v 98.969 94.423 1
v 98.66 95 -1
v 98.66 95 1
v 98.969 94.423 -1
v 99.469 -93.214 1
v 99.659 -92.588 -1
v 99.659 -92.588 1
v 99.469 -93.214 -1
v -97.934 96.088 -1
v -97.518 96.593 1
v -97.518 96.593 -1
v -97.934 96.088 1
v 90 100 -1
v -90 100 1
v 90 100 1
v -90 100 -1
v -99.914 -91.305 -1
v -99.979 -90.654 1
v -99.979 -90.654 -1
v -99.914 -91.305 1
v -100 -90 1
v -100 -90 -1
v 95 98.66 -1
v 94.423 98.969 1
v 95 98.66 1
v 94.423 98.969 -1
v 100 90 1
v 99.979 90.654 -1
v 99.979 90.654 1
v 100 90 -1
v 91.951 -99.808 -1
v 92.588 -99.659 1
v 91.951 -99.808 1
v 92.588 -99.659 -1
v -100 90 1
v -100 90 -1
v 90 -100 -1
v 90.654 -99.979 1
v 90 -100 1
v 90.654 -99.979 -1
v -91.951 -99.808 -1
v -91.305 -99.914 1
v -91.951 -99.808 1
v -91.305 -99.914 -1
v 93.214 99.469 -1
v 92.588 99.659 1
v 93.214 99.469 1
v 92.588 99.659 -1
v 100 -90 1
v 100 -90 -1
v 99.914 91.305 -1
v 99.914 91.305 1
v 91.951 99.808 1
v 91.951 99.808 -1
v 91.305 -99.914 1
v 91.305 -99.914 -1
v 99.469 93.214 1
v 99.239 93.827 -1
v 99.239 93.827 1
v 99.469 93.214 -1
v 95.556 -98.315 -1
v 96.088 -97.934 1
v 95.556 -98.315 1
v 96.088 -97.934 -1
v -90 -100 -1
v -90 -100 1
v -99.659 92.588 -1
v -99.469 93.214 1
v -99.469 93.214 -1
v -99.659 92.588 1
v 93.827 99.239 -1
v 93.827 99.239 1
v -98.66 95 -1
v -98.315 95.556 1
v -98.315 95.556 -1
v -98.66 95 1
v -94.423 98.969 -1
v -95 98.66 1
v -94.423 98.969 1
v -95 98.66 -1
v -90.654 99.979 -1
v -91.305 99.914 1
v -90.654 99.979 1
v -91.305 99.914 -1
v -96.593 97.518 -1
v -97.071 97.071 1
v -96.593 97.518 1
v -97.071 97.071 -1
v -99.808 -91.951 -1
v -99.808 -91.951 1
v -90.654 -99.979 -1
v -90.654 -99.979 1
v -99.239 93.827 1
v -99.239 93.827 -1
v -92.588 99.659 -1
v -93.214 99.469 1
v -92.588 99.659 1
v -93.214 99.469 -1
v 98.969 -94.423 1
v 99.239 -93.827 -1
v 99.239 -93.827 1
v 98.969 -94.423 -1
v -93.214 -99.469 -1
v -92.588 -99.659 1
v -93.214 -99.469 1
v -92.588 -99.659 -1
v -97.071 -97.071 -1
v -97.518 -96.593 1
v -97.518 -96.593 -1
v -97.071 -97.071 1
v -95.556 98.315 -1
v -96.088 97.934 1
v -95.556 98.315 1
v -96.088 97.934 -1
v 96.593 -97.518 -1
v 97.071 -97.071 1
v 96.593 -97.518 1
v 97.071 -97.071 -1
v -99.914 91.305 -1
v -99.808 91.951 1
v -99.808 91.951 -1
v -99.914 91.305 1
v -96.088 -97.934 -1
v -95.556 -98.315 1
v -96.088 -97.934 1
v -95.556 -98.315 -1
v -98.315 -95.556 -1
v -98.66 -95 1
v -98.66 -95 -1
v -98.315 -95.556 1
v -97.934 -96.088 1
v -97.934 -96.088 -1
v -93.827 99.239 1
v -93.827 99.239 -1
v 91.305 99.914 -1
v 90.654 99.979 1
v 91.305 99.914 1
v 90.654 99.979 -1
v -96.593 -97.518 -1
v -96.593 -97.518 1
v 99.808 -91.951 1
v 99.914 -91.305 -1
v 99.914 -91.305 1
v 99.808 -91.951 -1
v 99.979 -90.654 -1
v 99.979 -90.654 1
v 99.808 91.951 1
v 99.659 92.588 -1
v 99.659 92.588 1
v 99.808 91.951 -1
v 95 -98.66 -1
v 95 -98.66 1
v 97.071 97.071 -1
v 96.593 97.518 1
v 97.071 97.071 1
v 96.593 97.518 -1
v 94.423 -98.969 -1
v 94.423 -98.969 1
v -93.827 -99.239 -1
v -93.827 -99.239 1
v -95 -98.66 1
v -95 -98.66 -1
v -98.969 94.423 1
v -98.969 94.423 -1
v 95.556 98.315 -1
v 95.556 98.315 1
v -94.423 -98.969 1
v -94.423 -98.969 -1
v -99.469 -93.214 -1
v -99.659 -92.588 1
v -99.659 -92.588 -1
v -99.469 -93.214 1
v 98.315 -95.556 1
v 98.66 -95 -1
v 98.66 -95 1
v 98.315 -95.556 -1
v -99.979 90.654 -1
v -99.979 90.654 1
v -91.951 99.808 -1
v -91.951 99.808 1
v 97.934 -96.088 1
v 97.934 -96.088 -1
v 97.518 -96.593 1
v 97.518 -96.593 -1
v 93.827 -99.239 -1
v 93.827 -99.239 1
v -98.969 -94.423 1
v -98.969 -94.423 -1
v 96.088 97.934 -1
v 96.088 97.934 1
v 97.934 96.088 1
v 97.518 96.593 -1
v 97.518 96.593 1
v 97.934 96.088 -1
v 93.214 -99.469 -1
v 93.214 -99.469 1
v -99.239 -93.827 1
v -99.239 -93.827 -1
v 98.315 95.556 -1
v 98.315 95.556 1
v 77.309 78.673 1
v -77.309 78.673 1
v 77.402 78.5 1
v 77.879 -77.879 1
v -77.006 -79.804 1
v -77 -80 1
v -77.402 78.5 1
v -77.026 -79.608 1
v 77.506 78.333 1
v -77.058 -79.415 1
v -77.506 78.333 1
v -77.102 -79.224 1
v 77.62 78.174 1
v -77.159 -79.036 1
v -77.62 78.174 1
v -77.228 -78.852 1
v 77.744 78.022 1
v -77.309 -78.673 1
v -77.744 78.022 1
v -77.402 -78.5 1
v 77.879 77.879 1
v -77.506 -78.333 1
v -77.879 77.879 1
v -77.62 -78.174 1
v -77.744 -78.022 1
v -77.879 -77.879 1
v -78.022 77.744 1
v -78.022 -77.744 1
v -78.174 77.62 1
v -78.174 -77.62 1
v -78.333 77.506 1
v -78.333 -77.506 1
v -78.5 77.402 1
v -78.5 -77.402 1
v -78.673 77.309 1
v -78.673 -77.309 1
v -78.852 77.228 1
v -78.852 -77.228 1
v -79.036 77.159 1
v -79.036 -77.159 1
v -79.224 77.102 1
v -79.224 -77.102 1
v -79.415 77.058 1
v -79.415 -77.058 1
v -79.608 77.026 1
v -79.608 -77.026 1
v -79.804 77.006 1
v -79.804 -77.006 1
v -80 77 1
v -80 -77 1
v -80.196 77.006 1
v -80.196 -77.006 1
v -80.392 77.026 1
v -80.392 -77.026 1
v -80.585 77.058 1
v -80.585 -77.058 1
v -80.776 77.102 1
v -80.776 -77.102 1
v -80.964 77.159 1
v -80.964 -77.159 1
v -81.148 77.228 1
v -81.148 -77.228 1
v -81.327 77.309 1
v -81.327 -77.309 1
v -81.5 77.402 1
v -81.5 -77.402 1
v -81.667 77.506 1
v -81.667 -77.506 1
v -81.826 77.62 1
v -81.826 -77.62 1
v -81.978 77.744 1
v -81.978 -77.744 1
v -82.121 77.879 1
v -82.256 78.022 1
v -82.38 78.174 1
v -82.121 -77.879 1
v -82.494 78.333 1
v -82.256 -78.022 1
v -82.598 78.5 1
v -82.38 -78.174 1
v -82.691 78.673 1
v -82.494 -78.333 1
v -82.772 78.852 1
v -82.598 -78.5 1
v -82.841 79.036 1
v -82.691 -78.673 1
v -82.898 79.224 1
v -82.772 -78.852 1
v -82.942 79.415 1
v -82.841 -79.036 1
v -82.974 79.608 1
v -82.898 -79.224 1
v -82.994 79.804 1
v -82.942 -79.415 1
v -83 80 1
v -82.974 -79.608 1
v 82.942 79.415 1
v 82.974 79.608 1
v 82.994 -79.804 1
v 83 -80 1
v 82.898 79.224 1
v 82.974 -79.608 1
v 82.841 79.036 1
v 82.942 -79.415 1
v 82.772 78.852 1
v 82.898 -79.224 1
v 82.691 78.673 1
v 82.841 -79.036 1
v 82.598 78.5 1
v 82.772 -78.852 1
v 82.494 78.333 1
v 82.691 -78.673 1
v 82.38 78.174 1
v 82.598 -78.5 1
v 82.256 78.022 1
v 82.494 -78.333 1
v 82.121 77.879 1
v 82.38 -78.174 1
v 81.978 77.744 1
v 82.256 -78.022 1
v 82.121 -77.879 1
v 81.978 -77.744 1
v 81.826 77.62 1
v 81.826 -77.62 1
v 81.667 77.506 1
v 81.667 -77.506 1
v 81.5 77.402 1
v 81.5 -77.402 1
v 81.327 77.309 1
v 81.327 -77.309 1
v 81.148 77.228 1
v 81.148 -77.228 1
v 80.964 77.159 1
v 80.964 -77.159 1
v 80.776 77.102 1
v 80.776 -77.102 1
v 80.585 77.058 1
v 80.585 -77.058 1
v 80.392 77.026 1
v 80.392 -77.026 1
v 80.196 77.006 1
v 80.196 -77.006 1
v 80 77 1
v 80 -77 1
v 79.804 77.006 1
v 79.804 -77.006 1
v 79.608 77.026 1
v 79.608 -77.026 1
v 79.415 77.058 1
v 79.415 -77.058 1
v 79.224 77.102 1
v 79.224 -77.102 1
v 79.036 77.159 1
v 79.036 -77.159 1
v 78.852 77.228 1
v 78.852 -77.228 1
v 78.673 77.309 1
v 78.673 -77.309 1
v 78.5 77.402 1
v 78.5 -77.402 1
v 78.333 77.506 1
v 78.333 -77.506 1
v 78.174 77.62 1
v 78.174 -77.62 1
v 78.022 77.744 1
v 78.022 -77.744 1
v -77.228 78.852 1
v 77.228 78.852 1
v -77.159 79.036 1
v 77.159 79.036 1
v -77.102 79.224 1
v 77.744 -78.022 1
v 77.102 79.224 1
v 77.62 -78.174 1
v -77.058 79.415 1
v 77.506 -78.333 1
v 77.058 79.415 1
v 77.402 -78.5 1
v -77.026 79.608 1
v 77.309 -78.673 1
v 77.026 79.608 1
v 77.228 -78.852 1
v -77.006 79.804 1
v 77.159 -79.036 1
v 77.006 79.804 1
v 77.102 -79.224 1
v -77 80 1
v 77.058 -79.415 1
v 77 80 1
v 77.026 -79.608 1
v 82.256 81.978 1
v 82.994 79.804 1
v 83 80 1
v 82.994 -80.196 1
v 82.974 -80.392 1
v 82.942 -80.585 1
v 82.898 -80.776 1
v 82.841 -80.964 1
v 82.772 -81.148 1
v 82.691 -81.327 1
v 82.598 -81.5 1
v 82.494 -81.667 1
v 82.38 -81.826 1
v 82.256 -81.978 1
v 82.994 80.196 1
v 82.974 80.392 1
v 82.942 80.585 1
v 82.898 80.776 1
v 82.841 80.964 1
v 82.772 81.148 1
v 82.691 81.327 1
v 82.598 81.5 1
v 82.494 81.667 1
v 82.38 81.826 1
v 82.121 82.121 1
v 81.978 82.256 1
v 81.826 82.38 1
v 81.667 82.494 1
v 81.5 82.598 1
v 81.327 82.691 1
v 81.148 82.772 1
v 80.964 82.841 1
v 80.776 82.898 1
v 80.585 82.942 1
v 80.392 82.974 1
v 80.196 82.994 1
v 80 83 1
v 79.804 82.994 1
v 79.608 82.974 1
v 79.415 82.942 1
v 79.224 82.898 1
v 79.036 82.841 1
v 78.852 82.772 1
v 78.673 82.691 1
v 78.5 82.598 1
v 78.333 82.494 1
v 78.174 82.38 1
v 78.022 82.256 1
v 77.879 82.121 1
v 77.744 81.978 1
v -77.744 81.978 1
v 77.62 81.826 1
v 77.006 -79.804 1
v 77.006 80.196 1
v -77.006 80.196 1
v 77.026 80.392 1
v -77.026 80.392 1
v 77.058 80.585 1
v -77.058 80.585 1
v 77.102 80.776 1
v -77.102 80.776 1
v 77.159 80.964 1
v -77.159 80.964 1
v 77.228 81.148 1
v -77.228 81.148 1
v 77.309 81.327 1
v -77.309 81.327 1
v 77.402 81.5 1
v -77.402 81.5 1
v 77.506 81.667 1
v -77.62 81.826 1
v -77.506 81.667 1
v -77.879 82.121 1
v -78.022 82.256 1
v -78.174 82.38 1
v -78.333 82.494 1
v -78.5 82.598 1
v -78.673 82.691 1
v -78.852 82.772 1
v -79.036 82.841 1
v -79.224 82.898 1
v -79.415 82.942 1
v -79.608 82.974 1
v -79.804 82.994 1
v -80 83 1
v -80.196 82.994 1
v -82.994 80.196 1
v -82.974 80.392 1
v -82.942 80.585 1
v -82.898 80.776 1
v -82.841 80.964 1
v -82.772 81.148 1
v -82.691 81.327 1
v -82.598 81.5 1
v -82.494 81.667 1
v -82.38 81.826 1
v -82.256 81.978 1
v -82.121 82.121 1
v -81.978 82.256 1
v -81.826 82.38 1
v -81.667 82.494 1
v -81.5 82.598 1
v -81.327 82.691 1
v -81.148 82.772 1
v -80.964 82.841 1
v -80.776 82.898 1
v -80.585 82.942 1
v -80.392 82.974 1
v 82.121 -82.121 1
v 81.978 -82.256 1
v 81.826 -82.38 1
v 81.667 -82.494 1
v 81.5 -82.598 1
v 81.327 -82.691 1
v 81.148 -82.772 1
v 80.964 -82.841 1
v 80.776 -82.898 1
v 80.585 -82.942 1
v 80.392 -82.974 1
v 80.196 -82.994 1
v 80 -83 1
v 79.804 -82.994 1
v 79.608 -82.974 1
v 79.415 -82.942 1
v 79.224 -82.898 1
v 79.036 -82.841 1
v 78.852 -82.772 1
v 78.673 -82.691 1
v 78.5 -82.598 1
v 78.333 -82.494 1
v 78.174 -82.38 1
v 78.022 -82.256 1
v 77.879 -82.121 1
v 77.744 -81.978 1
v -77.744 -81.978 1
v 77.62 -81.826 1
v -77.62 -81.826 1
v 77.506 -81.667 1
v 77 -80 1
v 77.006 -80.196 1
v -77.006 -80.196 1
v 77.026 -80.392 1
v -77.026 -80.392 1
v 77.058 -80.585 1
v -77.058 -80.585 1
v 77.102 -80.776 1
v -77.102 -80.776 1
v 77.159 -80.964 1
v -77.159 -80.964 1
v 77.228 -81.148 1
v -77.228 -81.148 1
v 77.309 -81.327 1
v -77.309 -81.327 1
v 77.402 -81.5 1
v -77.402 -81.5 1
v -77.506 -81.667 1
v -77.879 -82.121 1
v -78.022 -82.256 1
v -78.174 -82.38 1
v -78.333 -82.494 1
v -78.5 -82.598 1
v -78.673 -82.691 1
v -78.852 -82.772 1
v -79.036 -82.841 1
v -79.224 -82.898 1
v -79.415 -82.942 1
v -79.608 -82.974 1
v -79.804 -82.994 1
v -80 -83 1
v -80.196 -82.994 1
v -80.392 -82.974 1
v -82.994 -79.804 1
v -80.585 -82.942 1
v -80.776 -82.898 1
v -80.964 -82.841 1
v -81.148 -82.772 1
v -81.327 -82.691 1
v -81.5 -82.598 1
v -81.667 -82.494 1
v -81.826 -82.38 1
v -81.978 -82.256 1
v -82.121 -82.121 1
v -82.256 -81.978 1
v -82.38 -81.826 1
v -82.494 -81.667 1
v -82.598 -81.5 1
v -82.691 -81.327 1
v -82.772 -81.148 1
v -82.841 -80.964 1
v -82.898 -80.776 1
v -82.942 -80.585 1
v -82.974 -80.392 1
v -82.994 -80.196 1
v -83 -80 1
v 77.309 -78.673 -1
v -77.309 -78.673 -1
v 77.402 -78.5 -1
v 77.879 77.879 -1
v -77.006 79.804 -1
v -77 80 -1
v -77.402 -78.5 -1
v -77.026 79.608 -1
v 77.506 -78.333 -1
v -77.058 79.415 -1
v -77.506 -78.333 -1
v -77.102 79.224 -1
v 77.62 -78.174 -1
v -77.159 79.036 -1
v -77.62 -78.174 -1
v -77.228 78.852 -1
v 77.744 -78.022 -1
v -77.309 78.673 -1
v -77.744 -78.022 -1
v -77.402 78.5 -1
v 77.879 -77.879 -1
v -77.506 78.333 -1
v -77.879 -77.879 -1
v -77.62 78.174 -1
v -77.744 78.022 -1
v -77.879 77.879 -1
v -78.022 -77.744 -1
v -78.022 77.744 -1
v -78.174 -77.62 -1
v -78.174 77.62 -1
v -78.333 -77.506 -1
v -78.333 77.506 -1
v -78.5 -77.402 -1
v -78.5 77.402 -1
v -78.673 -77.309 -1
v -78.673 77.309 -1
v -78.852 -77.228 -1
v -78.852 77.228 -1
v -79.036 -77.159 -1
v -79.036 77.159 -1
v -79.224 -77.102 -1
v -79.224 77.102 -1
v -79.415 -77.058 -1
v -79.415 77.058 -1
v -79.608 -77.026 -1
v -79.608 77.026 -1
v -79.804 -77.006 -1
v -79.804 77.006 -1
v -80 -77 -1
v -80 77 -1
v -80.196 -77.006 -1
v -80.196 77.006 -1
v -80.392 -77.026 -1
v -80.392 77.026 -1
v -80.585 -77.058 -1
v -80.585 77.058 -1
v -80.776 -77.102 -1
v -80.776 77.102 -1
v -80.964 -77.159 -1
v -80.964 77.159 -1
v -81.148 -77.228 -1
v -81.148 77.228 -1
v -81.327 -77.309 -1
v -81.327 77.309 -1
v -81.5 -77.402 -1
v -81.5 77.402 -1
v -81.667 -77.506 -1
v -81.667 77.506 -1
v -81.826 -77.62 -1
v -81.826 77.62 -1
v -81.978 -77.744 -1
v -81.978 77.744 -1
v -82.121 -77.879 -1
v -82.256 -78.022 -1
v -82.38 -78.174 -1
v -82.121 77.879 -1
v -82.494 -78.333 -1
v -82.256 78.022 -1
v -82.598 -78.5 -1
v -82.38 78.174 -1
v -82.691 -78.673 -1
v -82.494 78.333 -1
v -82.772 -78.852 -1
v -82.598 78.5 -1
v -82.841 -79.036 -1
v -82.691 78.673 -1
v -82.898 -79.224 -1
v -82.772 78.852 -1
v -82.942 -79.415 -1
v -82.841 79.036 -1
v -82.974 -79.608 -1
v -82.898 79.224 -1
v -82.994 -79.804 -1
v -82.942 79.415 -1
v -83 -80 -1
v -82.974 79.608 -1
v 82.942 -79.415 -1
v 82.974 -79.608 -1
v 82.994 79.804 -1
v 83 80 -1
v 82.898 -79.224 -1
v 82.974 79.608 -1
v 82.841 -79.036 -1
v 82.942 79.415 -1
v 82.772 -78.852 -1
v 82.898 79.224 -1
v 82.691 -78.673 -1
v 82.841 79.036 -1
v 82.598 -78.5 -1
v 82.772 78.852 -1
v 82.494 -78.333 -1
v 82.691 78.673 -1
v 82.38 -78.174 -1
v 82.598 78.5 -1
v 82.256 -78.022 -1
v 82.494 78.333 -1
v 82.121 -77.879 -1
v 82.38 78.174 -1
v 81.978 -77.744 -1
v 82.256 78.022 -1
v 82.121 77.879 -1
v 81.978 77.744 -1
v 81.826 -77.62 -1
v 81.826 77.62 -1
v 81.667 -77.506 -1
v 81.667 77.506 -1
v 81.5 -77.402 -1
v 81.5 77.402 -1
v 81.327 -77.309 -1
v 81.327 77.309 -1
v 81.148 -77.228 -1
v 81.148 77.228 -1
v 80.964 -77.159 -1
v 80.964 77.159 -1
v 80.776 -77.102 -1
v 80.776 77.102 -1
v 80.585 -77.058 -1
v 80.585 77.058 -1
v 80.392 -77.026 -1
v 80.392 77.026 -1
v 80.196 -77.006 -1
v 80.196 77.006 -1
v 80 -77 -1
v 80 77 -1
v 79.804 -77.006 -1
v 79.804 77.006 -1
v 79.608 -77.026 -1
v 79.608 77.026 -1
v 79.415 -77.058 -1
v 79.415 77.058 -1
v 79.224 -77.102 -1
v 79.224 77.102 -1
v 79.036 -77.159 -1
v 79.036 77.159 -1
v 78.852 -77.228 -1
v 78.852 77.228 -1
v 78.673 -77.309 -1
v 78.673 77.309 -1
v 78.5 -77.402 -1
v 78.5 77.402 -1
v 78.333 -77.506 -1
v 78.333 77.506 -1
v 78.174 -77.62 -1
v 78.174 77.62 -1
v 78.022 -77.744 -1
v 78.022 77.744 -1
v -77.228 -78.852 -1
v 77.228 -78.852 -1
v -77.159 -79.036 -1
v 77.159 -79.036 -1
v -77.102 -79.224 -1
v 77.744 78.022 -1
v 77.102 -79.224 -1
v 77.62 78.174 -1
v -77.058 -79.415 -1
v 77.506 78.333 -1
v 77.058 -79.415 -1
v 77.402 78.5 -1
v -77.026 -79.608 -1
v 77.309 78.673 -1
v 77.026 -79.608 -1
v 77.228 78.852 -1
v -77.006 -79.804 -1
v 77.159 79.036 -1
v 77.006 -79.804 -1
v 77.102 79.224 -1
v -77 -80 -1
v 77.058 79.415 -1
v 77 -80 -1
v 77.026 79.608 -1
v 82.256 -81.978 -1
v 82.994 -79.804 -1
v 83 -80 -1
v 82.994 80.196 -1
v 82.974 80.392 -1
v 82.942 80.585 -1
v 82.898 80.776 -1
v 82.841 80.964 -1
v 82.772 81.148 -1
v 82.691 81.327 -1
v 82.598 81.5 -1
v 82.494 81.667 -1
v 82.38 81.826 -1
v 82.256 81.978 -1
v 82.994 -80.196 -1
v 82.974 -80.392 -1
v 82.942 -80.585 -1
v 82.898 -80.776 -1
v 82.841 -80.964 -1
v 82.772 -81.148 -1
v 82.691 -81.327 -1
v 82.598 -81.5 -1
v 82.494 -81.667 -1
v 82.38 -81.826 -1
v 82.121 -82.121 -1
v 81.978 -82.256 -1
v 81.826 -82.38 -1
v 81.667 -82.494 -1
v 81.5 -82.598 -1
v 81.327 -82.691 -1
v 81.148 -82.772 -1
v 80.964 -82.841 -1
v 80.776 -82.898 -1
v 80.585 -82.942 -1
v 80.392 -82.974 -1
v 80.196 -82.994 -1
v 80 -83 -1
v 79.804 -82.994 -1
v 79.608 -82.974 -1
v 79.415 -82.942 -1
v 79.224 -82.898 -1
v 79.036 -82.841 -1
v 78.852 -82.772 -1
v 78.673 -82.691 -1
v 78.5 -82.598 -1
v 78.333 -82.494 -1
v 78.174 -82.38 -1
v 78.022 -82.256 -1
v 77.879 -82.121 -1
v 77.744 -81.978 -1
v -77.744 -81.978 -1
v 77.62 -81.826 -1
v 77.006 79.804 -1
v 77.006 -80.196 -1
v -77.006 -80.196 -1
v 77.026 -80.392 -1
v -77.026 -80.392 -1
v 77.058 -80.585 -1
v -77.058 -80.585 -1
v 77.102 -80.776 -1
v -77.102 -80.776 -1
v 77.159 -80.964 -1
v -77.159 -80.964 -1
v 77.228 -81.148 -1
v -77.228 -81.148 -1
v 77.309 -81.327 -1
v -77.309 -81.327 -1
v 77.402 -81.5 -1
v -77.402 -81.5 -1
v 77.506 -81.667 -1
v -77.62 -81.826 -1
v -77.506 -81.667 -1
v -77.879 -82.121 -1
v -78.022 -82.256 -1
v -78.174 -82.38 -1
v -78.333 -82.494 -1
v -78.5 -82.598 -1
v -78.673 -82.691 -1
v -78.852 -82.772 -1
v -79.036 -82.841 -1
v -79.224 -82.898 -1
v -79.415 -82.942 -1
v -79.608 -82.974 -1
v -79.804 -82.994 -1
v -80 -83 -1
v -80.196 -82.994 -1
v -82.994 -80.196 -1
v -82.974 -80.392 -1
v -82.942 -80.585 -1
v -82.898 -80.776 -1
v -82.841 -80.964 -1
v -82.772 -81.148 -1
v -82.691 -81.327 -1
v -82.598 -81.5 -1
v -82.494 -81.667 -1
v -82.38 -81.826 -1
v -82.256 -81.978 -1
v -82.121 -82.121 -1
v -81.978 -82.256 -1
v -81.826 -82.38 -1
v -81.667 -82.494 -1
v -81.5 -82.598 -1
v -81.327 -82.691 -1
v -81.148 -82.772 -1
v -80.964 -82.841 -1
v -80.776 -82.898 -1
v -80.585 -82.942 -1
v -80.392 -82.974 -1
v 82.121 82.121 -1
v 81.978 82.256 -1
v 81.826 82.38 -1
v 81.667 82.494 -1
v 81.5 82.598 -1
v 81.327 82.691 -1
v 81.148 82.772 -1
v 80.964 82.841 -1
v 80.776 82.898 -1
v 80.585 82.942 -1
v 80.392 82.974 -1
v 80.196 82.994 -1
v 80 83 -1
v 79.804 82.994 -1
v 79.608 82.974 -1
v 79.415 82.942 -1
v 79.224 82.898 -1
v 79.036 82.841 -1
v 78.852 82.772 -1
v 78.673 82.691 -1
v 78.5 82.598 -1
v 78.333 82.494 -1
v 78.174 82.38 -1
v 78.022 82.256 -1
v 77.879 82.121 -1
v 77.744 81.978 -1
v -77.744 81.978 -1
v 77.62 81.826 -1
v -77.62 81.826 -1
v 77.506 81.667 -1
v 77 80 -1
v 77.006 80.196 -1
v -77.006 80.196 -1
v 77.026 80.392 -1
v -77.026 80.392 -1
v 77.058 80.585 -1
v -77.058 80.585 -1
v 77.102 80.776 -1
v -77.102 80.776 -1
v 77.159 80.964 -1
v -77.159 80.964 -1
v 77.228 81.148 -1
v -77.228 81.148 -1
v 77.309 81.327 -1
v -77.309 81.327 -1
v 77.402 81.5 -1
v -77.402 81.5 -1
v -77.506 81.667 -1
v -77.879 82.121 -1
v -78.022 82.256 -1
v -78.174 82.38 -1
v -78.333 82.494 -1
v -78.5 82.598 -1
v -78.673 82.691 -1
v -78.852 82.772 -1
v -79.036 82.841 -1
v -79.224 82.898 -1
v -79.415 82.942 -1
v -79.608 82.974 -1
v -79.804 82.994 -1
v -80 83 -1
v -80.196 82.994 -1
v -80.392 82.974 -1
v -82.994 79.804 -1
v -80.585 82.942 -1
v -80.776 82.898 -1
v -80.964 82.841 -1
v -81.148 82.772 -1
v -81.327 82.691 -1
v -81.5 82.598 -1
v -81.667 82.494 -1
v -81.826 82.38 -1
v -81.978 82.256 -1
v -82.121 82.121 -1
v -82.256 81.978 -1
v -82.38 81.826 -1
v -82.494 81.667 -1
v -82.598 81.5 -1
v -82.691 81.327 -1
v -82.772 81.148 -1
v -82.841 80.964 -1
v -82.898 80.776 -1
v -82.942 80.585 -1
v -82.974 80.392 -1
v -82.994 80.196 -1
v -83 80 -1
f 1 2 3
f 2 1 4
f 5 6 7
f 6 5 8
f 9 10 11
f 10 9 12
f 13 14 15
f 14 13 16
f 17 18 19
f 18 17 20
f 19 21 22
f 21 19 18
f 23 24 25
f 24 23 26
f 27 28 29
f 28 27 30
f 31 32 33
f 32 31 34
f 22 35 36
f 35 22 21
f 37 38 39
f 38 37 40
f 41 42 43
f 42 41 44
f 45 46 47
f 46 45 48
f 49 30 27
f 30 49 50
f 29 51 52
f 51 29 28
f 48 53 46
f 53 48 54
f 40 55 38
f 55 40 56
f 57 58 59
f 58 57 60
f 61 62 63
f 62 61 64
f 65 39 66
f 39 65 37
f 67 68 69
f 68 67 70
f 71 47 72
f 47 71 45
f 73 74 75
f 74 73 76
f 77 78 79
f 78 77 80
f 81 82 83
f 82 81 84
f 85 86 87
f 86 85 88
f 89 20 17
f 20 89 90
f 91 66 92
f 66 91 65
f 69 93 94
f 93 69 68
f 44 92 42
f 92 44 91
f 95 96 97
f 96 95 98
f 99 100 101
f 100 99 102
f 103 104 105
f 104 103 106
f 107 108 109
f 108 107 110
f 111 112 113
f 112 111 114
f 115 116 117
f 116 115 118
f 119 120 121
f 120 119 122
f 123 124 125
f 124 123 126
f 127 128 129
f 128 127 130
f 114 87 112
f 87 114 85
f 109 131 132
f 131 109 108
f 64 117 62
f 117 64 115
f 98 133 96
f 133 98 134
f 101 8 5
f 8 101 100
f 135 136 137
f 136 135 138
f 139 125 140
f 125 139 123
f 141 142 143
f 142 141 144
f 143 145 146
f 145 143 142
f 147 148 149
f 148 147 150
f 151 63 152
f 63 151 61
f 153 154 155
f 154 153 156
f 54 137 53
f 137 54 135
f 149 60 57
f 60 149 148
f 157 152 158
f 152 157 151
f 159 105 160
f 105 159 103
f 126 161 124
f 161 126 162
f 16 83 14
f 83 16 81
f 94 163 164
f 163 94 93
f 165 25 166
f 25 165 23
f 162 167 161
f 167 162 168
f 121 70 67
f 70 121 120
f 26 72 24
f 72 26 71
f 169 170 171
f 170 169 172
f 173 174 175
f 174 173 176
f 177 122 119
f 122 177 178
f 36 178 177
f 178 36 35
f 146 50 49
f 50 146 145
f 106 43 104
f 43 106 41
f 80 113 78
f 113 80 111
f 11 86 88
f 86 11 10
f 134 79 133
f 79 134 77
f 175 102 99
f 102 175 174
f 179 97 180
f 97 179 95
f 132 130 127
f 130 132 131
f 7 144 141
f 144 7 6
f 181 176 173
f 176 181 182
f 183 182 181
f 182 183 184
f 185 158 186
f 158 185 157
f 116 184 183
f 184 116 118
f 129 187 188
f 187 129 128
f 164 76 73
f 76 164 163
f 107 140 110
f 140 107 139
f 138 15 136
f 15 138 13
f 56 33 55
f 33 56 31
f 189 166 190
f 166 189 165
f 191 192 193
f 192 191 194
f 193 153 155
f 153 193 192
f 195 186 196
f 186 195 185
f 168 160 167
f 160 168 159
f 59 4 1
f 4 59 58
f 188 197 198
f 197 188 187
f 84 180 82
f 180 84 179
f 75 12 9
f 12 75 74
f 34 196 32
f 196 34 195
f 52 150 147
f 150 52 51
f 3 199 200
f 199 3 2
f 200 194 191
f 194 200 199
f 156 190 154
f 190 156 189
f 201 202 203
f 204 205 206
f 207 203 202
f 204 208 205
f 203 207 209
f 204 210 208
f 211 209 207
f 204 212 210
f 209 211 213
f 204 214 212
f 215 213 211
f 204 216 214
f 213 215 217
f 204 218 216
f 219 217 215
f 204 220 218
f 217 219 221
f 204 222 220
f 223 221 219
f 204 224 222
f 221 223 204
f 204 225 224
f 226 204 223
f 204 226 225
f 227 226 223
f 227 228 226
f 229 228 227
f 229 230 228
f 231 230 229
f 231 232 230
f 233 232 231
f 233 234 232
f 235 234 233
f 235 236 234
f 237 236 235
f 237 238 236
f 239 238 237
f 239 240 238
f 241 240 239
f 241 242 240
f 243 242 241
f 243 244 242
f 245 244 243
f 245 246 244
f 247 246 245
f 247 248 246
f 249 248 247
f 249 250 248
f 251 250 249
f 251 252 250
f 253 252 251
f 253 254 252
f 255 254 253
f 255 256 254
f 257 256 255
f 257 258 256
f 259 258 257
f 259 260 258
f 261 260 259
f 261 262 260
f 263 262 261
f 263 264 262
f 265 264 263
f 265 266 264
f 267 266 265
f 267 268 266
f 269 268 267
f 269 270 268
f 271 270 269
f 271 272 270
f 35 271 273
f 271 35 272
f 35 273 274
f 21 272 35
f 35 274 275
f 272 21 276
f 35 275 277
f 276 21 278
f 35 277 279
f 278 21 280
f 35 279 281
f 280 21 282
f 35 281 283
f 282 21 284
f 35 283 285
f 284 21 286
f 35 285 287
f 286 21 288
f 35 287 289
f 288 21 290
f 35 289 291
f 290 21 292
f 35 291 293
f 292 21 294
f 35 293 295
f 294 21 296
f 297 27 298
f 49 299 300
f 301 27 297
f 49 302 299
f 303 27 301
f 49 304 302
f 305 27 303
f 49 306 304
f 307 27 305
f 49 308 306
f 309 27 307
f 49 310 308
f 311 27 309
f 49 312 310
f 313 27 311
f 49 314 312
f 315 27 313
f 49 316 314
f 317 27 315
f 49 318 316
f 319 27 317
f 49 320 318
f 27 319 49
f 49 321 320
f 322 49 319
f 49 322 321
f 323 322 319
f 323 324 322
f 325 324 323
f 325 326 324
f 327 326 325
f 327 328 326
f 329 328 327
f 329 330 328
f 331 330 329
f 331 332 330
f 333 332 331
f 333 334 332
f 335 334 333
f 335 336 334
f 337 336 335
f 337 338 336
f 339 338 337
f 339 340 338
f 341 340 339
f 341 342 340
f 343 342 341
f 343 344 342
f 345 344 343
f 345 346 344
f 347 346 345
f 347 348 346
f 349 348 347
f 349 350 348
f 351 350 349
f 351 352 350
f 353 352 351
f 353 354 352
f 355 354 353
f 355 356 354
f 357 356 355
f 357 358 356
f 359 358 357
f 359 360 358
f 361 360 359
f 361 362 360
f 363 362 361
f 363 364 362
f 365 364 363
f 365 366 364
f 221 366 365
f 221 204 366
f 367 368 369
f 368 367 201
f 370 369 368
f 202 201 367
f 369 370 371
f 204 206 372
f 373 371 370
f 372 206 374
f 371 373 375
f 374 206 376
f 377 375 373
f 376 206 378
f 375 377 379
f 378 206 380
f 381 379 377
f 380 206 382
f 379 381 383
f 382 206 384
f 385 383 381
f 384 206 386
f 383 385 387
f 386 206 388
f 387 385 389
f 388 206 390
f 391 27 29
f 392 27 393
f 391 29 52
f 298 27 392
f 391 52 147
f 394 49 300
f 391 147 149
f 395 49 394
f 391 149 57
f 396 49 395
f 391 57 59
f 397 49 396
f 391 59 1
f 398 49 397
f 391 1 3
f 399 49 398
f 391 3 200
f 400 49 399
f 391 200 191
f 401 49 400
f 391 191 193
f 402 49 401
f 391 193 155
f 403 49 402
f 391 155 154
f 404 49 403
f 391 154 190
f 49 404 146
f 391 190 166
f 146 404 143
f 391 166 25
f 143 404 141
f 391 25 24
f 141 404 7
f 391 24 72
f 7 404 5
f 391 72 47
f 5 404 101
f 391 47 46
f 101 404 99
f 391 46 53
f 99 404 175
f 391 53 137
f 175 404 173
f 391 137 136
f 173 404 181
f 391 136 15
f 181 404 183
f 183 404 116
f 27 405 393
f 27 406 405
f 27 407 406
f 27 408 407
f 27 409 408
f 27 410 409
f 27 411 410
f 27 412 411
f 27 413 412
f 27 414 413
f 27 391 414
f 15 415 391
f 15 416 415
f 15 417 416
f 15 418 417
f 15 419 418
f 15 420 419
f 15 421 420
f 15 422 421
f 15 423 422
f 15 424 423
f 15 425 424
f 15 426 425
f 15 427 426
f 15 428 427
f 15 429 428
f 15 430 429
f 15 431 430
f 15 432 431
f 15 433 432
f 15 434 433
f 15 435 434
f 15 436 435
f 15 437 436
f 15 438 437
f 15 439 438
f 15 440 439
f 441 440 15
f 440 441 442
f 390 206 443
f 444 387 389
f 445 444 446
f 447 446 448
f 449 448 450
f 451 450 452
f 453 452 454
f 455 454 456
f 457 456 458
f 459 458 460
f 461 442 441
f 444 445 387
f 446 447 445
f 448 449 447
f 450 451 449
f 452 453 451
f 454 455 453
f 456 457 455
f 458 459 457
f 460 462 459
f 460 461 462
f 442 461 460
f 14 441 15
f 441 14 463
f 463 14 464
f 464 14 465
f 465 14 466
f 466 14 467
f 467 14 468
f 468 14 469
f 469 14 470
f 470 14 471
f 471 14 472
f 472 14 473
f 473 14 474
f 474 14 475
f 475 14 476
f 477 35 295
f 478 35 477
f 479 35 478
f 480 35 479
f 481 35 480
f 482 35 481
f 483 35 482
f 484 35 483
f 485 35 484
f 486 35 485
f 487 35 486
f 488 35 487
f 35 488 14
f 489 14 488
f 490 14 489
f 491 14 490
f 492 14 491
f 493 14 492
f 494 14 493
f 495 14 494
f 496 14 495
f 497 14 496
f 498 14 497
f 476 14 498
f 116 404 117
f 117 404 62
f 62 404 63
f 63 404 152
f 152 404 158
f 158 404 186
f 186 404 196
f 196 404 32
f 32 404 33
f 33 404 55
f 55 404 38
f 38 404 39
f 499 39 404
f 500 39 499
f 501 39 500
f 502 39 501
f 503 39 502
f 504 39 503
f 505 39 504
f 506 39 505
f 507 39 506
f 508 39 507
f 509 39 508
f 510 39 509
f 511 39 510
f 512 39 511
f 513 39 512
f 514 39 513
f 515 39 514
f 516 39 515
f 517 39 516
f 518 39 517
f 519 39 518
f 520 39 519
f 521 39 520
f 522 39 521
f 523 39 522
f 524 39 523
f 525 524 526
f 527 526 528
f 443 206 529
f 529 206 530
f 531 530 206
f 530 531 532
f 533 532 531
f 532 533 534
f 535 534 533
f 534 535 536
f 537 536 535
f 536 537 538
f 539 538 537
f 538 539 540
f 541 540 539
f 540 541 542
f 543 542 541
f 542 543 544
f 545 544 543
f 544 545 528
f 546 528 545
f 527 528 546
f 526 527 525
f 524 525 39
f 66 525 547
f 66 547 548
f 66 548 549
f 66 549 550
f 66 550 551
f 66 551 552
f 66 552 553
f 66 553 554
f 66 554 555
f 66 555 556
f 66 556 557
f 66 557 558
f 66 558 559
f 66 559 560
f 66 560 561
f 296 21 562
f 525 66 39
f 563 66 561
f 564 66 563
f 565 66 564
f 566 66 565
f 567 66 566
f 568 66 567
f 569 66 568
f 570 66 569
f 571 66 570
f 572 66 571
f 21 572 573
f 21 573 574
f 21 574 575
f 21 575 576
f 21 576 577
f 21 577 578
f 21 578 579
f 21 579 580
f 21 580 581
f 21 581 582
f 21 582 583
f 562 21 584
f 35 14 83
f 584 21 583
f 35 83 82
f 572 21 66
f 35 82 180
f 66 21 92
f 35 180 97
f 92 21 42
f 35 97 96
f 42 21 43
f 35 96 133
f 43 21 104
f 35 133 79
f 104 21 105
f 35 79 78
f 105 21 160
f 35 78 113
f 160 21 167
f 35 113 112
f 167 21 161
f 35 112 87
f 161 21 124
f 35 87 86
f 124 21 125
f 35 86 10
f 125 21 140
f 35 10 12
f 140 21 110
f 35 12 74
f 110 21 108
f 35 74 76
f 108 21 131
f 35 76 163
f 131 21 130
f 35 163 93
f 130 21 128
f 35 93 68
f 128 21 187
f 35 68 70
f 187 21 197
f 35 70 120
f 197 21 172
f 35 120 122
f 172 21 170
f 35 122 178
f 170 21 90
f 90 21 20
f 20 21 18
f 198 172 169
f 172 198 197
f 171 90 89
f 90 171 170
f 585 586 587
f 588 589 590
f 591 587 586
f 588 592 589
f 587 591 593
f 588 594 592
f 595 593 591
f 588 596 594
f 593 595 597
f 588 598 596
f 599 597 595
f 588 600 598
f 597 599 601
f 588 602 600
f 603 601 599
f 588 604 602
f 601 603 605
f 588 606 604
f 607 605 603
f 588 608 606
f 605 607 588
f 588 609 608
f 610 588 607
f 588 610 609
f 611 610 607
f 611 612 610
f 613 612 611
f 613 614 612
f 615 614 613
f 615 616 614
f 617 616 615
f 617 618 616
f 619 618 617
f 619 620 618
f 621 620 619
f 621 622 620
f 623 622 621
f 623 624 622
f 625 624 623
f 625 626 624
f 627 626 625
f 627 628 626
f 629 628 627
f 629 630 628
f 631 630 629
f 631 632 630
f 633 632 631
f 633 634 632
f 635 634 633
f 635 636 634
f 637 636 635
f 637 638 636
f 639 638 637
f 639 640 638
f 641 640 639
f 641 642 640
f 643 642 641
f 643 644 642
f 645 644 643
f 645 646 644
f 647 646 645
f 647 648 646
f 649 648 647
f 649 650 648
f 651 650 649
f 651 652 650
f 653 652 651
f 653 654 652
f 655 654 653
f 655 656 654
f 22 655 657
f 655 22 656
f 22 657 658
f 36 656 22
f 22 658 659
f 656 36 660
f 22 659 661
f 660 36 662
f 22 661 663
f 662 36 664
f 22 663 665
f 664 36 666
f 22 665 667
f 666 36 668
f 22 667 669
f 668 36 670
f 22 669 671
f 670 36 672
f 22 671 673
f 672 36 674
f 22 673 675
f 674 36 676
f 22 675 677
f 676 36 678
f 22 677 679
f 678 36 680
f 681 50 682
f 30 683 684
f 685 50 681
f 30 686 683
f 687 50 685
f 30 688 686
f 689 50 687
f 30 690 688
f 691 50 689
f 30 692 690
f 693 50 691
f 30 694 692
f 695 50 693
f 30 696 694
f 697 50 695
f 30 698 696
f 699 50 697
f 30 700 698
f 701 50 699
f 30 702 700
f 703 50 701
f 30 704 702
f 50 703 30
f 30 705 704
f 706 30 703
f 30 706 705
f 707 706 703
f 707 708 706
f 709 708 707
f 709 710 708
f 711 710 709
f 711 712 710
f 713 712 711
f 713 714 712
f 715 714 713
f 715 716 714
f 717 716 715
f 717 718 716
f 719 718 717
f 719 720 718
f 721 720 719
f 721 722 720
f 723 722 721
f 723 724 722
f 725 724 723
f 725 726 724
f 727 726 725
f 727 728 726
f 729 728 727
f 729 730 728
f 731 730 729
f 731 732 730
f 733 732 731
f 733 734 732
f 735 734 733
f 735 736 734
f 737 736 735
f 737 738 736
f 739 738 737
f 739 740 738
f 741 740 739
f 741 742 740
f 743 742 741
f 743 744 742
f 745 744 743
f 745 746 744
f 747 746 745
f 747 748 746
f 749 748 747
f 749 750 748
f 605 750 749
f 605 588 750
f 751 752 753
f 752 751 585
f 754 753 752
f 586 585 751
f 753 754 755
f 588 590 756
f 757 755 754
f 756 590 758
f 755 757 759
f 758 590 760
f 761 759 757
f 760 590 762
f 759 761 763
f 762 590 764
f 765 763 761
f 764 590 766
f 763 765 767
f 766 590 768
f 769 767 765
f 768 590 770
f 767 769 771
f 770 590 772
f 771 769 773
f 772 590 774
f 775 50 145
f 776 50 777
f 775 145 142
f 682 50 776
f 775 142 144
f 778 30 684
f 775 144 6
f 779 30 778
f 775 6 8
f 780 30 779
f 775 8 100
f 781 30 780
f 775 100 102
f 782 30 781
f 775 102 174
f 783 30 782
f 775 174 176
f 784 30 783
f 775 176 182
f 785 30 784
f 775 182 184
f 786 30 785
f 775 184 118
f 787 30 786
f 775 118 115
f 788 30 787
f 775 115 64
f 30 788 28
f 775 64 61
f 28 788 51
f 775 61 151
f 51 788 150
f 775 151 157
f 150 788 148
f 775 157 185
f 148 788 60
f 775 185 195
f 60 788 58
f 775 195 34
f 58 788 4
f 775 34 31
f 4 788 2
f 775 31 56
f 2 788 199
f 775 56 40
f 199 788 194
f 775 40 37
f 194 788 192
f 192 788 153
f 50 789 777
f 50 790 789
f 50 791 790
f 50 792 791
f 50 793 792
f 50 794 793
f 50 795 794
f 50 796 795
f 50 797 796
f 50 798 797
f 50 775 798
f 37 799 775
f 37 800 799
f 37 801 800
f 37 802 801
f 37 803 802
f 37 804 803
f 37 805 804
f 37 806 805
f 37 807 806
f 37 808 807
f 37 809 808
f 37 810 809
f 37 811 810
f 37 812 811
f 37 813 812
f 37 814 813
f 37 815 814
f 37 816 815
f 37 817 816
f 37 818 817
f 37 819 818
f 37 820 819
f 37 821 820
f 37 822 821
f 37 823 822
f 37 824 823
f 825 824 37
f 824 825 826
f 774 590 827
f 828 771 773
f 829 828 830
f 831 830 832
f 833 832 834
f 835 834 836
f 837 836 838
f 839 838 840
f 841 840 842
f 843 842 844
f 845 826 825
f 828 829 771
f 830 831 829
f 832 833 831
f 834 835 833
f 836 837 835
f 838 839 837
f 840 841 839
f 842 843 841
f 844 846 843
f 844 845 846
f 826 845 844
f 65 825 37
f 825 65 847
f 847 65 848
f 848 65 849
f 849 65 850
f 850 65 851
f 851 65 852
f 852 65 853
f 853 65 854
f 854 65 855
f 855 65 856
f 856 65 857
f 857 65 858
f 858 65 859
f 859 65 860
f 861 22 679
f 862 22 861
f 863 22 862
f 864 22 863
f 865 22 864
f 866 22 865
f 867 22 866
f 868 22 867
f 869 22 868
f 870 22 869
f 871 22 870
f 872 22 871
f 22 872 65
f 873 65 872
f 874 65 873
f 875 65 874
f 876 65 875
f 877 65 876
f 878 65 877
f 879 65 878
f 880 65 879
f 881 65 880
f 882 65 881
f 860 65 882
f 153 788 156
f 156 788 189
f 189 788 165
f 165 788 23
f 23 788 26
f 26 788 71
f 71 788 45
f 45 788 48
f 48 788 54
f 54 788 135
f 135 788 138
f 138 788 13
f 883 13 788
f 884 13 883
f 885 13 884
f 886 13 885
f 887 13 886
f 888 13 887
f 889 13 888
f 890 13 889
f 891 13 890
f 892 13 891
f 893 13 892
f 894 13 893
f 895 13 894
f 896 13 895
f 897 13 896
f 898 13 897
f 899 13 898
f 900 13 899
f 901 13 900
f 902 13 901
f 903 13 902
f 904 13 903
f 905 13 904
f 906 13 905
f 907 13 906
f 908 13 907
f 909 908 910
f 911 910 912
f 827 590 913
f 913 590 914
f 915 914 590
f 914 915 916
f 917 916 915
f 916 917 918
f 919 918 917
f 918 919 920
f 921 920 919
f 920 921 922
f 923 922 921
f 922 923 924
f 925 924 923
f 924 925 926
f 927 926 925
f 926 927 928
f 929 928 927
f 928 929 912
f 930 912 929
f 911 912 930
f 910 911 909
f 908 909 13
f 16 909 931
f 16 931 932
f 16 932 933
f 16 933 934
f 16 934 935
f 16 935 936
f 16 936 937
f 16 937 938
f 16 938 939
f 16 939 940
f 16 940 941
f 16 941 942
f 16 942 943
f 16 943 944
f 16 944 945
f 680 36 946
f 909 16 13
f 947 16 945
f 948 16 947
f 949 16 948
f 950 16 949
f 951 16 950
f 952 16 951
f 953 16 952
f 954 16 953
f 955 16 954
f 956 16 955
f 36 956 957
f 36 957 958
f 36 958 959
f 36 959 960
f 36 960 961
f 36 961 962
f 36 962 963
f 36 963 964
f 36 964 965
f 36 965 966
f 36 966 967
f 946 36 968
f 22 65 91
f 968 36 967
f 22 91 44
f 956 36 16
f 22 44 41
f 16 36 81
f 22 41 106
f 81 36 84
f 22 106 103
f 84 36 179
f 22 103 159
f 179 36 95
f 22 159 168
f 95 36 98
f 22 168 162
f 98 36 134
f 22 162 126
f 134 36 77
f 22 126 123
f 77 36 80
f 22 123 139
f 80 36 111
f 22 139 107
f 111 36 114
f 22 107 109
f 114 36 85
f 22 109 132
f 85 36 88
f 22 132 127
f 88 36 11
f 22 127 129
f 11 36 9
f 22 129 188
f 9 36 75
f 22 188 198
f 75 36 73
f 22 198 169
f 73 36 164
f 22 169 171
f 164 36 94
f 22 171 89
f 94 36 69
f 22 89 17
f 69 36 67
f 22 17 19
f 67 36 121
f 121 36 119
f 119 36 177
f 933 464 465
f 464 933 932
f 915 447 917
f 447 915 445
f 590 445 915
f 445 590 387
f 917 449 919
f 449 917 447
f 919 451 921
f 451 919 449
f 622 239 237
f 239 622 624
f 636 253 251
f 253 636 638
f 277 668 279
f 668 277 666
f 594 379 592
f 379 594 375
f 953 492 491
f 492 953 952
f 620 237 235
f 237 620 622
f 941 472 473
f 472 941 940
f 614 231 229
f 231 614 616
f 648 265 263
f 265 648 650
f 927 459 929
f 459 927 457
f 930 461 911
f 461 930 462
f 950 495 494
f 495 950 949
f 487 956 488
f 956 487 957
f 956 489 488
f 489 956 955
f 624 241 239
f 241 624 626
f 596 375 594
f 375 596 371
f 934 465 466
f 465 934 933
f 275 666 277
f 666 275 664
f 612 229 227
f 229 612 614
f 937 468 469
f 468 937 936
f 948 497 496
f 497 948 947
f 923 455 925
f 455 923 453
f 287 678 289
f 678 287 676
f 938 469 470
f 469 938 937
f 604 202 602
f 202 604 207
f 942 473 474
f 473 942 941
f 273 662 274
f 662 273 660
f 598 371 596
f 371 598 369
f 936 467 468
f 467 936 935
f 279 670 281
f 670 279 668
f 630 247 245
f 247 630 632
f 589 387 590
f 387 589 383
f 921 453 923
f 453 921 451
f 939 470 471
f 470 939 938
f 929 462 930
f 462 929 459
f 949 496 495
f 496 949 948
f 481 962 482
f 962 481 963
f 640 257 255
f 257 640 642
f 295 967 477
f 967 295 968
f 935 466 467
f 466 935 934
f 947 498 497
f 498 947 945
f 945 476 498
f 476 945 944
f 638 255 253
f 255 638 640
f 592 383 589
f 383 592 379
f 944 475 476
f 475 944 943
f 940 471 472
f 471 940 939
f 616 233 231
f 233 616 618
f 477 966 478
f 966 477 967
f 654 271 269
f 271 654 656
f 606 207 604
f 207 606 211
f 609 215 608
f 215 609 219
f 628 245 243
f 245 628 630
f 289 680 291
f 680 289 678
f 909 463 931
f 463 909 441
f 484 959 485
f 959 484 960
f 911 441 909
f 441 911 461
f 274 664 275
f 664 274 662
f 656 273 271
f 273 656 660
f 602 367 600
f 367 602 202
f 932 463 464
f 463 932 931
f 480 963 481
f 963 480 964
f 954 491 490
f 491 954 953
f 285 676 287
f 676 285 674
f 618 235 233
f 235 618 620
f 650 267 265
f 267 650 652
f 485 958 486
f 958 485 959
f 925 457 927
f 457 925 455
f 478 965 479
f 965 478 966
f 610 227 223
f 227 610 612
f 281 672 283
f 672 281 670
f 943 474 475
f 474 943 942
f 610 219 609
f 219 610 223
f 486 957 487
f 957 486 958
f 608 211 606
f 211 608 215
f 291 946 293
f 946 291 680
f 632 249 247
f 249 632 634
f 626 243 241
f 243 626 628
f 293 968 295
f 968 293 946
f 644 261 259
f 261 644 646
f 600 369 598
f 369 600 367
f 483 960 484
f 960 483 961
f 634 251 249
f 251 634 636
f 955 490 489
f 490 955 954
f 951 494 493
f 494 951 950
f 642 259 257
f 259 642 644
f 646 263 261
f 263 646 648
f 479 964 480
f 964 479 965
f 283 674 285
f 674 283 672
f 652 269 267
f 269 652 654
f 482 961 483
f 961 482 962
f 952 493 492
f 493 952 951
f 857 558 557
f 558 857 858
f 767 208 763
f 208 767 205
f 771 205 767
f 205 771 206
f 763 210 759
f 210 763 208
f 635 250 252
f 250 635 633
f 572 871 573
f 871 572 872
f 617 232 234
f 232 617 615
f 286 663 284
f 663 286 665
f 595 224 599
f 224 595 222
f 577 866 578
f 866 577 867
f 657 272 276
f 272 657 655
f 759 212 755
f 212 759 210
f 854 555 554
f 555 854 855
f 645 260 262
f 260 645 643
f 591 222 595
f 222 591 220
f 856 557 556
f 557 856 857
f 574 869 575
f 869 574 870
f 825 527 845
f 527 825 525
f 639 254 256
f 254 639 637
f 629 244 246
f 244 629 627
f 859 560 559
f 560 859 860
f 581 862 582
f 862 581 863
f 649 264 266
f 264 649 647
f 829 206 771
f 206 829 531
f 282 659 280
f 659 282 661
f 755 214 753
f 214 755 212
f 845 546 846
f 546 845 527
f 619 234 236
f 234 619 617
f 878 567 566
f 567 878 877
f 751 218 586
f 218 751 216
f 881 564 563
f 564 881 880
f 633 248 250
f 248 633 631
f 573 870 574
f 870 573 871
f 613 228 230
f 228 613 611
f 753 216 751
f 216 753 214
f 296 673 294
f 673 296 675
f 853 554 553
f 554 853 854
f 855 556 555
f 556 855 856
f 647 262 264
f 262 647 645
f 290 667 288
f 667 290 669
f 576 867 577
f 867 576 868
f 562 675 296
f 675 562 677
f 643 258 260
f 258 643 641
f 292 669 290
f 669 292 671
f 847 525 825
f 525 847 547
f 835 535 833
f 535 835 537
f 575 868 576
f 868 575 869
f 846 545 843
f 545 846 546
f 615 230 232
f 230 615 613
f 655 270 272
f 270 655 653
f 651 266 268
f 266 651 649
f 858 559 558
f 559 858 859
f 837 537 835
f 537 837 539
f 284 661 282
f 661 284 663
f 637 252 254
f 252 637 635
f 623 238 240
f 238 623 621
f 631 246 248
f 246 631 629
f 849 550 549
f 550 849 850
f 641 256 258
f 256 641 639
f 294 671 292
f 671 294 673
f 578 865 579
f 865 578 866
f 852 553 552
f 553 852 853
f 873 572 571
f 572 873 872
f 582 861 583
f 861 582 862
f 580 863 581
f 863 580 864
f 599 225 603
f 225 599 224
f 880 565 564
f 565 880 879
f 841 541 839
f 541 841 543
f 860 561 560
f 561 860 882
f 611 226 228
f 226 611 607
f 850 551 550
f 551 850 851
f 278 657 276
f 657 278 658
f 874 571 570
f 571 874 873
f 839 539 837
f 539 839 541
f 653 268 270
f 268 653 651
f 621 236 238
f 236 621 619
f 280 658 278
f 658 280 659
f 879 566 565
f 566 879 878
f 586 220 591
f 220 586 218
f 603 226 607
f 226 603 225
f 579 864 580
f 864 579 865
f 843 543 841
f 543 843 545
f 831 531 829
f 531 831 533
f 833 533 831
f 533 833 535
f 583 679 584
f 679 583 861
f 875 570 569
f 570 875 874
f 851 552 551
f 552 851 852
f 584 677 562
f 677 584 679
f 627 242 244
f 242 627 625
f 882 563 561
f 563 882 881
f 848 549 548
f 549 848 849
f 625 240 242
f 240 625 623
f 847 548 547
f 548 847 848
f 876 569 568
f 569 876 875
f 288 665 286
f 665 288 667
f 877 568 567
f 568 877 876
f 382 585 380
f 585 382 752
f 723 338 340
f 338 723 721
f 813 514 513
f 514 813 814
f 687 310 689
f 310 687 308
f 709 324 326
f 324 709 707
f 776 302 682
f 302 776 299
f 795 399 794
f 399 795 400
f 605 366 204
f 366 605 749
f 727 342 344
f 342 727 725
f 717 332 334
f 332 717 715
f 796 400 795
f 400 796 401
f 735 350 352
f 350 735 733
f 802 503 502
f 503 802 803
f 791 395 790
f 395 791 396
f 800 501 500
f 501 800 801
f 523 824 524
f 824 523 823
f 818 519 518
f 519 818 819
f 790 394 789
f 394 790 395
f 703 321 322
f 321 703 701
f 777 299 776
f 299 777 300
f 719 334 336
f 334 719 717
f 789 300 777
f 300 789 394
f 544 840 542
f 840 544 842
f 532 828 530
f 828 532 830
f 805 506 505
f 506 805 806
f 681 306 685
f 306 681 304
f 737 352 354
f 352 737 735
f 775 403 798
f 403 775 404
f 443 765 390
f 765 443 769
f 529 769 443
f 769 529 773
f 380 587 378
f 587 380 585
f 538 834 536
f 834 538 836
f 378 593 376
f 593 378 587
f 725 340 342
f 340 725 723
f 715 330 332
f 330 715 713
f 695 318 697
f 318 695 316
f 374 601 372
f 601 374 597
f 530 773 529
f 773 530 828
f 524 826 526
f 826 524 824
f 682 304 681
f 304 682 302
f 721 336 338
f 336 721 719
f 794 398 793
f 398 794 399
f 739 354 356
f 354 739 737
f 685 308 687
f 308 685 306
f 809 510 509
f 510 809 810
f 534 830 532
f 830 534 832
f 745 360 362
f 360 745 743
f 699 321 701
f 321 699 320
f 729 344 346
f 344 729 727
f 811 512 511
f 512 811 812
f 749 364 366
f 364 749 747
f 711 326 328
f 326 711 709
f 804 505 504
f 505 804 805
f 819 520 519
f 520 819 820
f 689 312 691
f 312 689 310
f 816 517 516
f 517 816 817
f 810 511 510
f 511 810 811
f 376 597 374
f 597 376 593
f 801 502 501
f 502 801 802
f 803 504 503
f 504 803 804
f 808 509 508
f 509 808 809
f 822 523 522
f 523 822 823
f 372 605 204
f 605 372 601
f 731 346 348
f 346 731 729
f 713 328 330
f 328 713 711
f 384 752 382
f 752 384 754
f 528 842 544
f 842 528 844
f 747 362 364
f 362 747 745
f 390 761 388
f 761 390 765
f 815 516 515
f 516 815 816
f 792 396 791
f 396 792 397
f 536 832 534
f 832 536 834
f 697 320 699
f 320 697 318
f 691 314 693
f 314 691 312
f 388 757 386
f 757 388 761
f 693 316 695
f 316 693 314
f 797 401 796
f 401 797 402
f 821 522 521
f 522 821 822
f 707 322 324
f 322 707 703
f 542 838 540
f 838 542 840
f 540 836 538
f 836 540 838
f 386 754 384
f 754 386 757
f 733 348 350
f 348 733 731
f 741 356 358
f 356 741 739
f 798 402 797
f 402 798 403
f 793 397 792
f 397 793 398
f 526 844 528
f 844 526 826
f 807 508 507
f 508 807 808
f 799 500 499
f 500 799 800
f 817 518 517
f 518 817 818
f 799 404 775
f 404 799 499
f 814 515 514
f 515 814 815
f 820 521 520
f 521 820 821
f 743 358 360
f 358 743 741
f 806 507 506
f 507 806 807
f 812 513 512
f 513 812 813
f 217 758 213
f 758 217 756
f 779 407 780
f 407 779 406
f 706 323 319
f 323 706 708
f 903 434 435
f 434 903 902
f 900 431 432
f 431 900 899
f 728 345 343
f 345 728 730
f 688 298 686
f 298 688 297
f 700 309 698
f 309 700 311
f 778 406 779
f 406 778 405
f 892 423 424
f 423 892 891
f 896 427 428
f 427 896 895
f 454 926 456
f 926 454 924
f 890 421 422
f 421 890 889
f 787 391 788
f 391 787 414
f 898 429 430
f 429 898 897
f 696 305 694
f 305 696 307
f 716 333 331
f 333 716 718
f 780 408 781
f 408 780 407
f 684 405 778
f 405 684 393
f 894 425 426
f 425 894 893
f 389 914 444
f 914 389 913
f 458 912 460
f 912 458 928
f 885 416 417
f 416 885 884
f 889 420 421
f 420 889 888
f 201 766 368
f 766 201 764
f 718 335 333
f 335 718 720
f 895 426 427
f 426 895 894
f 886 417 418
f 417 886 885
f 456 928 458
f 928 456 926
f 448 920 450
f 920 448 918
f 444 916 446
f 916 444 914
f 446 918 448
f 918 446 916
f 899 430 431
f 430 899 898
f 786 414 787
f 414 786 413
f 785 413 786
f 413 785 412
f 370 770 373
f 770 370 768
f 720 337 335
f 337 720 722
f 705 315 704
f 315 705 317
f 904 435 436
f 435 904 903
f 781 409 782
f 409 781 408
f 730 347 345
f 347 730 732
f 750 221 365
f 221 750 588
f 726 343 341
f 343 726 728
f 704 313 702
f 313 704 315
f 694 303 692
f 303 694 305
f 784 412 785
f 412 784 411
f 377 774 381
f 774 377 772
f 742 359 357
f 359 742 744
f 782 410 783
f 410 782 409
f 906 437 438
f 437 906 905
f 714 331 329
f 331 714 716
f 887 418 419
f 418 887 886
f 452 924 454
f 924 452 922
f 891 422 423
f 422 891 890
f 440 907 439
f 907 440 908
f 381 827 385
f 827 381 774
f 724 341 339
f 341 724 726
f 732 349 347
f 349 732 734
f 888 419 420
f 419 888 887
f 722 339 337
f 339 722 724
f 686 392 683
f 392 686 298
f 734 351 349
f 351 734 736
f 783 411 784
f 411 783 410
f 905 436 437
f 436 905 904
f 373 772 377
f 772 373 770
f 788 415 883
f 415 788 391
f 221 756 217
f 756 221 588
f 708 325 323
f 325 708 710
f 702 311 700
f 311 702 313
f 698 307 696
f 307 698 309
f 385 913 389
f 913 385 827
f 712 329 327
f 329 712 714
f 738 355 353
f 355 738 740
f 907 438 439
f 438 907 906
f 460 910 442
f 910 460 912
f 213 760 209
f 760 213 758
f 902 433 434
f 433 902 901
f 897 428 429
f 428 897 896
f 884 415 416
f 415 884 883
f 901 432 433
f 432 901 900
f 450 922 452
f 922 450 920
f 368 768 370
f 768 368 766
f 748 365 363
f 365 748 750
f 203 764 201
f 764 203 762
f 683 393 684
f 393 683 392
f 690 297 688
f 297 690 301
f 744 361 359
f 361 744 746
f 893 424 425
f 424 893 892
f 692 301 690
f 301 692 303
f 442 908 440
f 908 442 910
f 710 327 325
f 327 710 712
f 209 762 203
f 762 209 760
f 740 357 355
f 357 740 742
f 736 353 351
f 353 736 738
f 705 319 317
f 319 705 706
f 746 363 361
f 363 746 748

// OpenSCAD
// Parameters
sheet_length = 200; //[100:400:1]
sheet_width = 200;  //[100:400:1]
sheet_thickness = 2; //[1:6:0.5]
corner_radius = 10; //[5:20:1]
hole_diameter = 6;  //[3:12:0.5]
hole_edge_offset = 20; //[10:40:1]
chamfer_size = 1;   //[0.5:3:0.25]
overlap = 1;        //[0.5:2:0.5]

$fn = 96;

// 2D rounded rectangle (robust, non-Minkowski 3D)
module rounded_rect_2d(L, W, R) {
  R2 = min(R, min(L, W)/2);
  hull() {
    for (sx = [-1, 1], sy = [-1, 1])
      translate([sx*(L/2 - R2), sy*(W/2 - R2)])
        circle(r = R2);
  }
}

// Main sheet (single connected solid)
module sheet_solid() {
  linear_extrude(height = sheet_thickness, center = true)
    rounded_rect_2d(sheet_length, sheet_width, corner_radius);
}

// Mounting holes (through)
module hole_at(x, y) {
  translate([x, y, 0])
    cylinder(h = sheet_thickness + 2*overlap, r = hole_diameter/2, center = true);
}

// Final part
module sheet_with_holes() {
  difference() {
    sheet_solid();

    xh = sheet_length/2 - hole_edge_offset;
    yh = sheet_width/2  - hole_edge_offset;

    hole_at(-xh,  yh);
    hole_at(-xh, -yh);
    hole_at( xh, -yh);
    hole_at( xh,  yh);
  }
}

color("Silver") sheet_with_holes();
